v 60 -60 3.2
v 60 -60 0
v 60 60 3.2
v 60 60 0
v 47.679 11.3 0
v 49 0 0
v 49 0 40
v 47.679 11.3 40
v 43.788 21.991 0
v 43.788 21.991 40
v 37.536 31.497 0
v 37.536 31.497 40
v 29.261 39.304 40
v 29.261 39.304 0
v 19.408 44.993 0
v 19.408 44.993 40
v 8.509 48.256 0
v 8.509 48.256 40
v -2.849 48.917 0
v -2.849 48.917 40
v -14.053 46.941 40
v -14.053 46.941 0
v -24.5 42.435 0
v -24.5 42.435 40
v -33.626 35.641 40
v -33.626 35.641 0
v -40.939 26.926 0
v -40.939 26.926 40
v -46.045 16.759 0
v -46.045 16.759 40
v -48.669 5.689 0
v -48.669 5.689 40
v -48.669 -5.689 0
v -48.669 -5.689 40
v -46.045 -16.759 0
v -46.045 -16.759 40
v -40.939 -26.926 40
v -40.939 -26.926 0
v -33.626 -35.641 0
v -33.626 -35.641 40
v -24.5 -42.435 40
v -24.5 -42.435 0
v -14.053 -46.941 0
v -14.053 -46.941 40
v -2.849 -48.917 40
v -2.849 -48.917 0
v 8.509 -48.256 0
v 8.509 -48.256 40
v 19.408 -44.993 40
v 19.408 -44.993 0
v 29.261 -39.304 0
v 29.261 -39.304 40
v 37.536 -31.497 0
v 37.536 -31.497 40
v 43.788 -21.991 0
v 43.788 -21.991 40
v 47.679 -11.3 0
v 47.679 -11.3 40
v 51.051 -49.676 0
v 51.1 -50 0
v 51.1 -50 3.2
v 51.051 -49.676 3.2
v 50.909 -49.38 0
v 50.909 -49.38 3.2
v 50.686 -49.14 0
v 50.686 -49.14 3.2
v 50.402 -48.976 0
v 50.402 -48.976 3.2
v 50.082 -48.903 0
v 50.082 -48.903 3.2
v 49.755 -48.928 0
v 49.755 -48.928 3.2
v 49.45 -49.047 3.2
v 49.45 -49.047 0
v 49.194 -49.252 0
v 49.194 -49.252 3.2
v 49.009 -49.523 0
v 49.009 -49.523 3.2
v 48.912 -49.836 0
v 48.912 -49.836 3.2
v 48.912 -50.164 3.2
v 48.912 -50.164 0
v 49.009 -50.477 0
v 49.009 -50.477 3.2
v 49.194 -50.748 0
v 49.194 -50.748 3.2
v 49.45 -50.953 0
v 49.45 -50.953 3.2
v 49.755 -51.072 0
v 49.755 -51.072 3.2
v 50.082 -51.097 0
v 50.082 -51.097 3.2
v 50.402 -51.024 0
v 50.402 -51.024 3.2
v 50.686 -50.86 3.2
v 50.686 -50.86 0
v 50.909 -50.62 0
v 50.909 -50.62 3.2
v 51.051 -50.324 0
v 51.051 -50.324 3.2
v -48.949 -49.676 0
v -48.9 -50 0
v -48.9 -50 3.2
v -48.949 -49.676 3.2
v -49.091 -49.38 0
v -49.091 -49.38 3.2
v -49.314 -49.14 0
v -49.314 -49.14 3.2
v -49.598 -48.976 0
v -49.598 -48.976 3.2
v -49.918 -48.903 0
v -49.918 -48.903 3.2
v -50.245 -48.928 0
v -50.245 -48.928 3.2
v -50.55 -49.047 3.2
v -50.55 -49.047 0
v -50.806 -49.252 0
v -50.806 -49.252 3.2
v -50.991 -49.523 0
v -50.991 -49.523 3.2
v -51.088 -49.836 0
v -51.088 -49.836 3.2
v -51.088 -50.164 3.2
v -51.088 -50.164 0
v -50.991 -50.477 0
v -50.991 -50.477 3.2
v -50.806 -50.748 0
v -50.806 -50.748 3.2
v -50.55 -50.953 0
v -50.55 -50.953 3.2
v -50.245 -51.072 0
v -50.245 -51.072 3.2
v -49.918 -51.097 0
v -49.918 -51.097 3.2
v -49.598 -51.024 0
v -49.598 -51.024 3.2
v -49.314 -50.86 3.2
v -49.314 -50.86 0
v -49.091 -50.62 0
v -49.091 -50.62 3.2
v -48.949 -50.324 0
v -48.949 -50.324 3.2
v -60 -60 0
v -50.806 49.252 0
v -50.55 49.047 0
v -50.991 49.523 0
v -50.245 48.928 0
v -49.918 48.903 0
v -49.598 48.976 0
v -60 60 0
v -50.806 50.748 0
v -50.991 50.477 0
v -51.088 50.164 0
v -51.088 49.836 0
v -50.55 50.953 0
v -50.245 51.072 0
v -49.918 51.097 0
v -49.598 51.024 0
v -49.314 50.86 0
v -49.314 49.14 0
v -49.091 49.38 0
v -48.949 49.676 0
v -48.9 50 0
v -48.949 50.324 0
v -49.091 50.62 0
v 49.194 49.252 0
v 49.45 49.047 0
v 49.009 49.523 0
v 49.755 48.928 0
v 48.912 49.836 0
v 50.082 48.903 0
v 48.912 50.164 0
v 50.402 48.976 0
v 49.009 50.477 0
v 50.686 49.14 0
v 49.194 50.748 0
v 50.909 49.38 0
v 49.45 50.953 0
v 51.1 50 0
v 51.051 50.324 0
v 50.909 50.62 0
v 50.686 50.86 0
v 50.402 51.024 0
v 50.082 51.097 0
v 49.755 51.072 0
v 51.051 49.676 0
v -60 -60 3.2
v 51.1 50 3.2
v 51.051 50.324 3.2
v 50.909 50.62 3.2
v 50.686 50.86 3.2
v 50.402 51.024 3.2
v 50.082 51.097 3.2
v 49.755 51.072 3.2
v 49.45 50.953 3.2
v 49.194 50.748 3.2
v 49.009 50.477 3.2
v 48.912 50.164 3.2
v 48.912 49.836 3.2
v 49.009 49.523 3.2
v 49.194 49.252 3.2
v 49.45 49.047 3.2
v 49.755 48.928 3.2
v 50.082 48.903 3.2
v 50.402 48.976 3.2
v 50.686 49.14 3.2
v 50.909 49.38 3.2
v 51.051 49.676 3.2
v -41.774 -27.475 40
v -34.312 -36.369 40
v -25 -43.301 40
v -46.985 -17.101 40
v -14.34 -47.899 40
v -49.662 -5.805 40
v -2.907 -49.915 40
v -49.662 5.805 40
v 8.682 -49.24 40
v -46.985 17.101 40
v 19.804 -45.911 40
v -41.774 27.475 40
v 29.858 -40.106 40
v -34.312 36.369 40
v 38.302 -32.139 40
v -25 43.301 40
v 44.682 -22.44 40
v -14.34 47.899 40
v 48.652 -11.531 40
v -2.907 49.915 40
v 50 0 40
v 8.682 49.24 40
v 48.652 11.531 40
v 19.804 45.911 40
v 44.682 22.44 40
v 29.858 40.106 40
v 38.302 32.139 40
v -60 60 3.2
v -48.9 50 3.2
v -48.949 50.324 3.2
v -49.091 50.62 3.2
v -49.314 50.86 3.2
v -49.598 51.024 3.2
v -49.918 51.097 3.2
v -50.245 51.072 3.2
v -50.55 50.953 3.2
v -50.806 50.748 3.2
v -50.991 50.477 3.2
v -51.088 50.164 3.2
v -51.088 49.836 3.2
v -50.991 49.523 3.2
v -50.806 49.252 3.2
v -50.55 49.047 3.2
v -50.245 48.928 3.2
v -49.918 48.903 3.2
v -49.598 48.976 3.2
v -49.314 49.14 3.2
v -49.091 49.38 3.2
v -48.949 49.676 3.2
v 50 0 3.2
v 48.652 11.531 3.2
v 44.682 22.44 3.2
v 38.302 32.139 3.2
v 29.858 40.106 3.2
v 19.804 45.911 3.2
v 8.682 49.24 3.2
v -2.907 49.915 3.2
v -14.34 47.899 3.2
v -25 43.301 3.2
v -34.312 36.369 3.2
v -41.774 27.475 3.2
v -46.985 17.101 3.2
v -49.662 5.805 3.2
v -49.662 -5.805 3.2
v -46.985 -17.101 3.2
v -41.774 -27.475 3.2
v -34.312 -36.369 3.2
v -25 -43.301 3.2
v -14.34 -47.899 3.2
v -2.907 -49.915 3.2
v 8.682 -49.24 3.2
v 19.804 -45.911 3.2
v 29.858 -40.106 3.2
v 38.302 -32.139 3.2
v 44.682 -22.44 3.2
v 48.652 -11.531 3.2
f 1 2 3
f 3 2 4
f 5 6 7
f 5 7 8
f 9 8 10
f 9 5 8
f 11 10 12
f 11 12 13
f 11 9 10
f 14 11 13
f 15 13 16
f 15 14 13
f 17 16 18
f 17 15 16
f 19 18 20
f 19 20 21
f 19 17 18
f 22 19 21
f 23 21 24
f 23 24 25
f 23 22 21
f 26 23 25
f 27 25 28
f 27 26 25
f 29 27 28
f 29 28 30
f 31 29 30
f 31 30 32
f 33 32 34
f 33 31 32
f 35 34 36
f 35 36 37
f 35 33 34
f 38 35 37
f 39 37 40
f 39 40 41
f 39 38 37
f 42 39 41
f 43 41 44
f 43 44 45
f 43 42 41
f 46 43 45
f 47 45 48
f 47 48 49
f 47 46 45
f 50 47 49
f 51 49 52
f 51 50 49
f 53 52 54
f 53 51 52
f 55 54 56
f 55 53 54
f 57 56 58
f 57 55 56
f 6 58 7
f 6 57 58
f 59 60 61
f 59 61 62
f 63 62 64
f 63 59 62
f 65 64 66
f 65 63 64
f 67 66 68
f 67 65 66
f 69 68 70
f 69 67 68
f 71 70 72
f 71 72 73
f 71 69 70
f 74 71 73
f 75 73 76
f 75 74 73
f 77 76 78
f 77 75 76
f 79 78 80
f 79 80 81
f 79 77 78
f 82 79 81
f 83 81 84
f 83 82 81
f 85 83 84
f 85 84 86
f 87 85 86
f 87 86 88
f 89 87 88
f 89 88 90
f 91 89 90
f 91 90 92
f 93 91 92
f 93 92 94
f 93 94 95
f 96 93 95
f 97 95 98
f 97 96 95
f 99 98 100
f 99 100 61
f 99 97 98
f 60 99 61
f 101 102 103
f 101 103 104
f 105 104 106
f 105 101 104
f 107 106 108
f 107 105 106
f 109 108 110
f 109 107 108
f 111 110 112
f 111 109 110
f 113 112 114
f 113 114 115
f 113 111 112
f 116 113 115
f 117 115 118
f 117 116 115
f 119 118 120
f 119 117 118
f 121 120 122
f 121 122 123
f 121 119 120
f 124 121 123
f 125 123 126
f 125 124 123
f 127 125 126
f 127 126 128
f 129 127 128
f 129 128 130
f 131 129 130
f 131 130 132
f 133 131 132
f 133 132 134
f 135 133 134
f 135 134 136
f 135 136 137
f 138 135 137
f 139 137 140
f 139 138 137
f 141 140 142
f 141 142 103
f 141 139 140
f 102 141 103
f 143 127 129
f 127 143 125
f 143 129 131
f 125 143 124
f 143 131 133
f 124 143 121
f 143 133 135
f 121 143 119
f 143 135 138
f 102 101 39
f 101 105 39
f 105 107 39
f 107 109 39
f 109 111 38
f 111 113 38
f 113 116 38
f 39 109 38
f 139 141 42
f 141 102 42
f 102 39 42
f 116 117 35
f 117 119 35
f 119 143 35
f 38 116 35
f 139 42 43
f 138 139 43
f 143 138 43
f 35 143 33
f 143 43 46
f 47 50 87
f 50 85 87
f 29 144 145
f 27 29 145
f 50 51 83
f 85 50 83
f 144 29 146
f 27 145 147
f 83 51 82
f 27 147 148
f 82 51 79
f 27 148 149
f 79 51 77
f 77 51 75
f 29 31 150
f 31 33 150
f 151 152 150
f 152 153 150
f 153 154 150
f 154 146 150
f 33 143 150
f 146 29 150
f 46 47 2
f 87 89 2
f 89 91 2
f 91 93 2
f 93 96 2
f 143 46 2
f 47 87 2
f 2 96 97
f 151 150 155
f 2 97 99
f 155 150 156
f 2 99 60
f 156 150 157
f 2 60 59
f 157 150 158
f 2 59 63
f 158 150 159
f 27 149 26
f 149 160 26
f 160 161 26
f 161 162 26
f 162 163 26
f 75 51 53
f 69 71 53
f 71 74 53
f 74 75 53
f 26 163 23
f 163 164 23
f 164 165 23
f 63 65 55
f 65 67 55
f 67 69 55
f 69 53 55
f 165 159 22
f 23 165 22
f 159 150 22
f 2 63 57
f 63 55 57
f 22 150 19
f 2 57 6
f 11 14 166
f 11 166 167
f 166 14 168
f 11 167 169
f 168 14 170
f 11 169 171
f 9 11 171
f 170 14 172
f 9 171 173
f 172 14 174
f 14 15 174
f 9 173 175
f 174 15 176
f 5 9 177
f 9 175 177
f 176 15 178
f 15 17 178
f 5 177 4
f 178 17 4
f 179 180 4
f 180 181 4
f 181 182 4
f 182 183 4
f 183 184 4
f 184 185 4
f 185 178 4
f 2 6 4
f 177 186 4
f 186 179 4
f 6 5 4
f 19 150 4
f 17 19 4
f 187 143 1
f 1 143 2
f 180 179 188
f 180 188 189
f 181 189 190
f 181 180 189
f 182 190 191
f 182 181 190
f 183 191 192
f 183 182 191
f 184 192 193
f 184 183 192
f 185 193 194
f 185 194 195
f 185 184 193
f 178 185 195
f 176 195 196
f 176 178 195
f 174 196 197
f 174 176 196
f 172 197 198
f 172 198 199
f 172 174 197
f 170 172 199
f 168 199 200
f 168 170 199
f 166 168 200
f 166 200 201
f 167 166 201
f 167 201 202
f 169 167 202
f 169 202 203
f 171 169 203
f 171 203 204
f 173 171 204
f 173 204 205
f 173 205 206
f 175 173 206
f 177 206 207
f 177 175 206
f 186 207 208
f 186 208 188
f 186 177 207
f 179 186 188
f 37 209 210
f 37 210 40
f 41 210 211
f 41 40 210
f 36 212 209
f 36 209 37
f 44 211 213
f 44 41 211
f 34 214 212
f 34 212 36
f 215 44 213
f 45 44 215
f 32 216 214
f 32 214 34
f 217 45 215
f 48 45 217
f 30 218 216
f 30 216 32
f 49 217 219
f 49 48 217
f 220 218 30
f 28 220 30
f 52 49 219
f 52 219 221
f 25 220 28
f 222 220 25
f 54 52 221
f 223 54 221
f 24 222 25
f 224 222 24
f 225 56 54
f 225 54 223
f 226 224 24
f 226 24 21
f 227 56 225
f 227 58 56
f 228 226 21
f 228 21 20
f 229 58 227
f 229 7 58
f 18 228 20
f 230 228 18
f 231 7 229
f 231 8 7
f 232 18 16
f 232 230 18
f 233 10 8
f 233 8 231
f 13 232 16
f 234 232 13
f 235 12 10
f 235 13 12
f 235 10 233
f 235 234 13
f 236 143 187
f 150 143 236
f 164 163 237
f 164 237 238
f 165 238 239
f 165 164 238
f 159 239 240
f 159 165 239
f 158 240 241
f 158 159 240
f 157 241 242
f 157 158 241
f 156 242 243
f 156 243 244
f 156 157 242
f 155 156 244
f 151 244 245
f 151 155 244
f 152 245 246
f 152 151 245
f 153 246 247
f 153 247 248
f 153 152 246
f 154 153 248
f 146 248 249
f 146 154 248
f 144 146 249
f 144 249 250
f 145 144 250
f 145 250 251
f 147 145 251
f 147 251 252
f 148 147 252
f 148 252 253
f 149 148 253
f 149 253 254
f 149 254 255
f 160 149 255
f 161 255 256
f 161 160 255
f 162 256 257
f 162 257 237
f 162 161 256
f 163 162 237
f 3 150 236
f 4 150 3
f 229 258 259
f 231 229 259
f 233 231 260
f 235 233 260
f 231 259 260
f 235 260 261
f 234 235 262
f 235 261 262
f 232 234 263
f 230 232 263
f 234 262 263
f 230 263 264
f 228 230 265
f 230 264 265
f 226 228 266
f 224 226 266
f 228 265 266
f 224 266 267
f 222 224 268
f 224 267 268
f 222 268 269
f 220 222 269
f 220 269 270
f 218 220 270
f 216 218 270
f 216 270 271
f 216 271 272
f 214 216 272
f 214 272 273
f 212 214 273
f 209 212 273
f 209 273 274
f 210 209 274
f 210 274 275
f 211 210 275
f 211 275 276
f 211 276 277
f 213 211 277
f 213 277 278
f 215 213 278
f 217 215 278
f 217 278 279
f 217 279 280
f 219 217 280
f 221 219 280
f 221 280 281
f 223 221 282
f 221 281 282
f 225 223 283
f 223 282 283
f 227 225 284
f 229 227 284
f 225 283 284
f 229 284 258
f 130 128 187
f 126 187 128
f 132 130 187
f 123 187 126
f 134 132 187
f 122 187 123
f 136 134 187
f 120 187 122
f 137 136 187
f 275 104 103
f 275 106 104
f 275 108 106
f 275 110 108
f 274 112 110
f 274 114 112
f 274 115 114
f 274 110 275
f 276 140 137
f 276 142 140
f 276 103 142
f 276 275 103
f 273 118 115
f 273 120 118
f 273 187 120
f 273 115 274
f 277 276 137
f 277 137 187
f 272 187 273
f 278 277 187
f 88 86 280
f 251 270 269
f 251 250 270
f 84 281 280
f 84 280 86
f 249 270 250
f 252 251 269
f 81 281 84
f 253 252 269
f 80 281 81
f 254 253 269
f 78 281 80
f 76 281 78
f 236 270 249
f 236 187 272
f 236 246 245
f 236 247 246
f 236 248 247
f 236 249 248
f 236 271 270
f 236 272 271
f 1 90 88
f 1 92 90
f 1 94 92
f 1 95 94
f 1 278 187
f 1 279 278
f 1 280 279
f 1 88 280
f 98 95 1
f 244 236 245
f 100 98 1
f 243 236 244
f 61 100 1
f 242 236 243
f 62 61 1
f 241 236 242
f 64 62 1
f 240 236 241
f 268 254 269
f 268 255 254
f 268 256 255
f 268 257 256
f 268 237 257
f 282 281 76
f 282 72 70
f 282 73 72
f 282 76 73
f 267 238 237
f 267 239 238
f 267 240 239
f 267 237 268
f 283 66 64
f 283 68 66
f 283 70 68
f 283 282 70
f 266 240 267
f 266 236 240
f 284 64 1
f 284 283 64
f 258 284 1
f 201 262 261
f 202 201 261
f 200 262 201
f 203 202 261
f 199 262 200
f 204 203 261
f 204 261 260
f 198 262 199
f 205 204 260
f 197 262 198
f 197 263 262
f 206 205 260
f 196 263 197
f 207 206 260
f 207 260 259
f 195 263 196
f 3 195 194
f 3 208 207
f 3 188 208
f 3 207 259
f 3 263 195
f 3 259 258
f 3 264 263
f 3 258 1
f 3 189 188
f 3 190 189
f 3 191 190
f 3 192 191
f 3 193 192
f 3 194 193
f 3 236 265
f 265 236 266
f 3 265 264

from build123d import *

# Parameters (mm, degrees)
F0_W     = 120
F0_H     = 120
F0_R     = 1.1
F0_R_2   = 50
F1_DEPTH = 3.2
F0_R_3   = 49
F2_DEPTH = 40


with BuildPart() as f1:
    # F0 (on Top) → F1 (new body)
    with BuildSketch(Plane.XY):
        Rectangle(F0_W, F0_H)
        with Locations((-50, -50)):
            Circle(F0_R, mode=Mode.SUBTRACT)
        with Locations((50, -50)):
            Circle(F0_R, mode=Mode.SUBTRACT)
        with Locations((-50, 50)):
            Circle(F0_R, mode=Mode.SUBTRACT)
        Circle(F0_R_2, mode=Mode.SUBTRACT)
        with Locations((50, 50)):
            Circle(F0_R, mode=Mode.SUBTRACT)
    extrude(amount=F1_DEPTH)

    # F0 (on Top) → F2 (join)
    with BuildSketch(Plane.XY):
        Circle(F0_R_2)
        Circle(F0_R_3, mode=Mode.SUBTRACT)
    extrude(amount=F2_DEPTH)


solid = f1.part
